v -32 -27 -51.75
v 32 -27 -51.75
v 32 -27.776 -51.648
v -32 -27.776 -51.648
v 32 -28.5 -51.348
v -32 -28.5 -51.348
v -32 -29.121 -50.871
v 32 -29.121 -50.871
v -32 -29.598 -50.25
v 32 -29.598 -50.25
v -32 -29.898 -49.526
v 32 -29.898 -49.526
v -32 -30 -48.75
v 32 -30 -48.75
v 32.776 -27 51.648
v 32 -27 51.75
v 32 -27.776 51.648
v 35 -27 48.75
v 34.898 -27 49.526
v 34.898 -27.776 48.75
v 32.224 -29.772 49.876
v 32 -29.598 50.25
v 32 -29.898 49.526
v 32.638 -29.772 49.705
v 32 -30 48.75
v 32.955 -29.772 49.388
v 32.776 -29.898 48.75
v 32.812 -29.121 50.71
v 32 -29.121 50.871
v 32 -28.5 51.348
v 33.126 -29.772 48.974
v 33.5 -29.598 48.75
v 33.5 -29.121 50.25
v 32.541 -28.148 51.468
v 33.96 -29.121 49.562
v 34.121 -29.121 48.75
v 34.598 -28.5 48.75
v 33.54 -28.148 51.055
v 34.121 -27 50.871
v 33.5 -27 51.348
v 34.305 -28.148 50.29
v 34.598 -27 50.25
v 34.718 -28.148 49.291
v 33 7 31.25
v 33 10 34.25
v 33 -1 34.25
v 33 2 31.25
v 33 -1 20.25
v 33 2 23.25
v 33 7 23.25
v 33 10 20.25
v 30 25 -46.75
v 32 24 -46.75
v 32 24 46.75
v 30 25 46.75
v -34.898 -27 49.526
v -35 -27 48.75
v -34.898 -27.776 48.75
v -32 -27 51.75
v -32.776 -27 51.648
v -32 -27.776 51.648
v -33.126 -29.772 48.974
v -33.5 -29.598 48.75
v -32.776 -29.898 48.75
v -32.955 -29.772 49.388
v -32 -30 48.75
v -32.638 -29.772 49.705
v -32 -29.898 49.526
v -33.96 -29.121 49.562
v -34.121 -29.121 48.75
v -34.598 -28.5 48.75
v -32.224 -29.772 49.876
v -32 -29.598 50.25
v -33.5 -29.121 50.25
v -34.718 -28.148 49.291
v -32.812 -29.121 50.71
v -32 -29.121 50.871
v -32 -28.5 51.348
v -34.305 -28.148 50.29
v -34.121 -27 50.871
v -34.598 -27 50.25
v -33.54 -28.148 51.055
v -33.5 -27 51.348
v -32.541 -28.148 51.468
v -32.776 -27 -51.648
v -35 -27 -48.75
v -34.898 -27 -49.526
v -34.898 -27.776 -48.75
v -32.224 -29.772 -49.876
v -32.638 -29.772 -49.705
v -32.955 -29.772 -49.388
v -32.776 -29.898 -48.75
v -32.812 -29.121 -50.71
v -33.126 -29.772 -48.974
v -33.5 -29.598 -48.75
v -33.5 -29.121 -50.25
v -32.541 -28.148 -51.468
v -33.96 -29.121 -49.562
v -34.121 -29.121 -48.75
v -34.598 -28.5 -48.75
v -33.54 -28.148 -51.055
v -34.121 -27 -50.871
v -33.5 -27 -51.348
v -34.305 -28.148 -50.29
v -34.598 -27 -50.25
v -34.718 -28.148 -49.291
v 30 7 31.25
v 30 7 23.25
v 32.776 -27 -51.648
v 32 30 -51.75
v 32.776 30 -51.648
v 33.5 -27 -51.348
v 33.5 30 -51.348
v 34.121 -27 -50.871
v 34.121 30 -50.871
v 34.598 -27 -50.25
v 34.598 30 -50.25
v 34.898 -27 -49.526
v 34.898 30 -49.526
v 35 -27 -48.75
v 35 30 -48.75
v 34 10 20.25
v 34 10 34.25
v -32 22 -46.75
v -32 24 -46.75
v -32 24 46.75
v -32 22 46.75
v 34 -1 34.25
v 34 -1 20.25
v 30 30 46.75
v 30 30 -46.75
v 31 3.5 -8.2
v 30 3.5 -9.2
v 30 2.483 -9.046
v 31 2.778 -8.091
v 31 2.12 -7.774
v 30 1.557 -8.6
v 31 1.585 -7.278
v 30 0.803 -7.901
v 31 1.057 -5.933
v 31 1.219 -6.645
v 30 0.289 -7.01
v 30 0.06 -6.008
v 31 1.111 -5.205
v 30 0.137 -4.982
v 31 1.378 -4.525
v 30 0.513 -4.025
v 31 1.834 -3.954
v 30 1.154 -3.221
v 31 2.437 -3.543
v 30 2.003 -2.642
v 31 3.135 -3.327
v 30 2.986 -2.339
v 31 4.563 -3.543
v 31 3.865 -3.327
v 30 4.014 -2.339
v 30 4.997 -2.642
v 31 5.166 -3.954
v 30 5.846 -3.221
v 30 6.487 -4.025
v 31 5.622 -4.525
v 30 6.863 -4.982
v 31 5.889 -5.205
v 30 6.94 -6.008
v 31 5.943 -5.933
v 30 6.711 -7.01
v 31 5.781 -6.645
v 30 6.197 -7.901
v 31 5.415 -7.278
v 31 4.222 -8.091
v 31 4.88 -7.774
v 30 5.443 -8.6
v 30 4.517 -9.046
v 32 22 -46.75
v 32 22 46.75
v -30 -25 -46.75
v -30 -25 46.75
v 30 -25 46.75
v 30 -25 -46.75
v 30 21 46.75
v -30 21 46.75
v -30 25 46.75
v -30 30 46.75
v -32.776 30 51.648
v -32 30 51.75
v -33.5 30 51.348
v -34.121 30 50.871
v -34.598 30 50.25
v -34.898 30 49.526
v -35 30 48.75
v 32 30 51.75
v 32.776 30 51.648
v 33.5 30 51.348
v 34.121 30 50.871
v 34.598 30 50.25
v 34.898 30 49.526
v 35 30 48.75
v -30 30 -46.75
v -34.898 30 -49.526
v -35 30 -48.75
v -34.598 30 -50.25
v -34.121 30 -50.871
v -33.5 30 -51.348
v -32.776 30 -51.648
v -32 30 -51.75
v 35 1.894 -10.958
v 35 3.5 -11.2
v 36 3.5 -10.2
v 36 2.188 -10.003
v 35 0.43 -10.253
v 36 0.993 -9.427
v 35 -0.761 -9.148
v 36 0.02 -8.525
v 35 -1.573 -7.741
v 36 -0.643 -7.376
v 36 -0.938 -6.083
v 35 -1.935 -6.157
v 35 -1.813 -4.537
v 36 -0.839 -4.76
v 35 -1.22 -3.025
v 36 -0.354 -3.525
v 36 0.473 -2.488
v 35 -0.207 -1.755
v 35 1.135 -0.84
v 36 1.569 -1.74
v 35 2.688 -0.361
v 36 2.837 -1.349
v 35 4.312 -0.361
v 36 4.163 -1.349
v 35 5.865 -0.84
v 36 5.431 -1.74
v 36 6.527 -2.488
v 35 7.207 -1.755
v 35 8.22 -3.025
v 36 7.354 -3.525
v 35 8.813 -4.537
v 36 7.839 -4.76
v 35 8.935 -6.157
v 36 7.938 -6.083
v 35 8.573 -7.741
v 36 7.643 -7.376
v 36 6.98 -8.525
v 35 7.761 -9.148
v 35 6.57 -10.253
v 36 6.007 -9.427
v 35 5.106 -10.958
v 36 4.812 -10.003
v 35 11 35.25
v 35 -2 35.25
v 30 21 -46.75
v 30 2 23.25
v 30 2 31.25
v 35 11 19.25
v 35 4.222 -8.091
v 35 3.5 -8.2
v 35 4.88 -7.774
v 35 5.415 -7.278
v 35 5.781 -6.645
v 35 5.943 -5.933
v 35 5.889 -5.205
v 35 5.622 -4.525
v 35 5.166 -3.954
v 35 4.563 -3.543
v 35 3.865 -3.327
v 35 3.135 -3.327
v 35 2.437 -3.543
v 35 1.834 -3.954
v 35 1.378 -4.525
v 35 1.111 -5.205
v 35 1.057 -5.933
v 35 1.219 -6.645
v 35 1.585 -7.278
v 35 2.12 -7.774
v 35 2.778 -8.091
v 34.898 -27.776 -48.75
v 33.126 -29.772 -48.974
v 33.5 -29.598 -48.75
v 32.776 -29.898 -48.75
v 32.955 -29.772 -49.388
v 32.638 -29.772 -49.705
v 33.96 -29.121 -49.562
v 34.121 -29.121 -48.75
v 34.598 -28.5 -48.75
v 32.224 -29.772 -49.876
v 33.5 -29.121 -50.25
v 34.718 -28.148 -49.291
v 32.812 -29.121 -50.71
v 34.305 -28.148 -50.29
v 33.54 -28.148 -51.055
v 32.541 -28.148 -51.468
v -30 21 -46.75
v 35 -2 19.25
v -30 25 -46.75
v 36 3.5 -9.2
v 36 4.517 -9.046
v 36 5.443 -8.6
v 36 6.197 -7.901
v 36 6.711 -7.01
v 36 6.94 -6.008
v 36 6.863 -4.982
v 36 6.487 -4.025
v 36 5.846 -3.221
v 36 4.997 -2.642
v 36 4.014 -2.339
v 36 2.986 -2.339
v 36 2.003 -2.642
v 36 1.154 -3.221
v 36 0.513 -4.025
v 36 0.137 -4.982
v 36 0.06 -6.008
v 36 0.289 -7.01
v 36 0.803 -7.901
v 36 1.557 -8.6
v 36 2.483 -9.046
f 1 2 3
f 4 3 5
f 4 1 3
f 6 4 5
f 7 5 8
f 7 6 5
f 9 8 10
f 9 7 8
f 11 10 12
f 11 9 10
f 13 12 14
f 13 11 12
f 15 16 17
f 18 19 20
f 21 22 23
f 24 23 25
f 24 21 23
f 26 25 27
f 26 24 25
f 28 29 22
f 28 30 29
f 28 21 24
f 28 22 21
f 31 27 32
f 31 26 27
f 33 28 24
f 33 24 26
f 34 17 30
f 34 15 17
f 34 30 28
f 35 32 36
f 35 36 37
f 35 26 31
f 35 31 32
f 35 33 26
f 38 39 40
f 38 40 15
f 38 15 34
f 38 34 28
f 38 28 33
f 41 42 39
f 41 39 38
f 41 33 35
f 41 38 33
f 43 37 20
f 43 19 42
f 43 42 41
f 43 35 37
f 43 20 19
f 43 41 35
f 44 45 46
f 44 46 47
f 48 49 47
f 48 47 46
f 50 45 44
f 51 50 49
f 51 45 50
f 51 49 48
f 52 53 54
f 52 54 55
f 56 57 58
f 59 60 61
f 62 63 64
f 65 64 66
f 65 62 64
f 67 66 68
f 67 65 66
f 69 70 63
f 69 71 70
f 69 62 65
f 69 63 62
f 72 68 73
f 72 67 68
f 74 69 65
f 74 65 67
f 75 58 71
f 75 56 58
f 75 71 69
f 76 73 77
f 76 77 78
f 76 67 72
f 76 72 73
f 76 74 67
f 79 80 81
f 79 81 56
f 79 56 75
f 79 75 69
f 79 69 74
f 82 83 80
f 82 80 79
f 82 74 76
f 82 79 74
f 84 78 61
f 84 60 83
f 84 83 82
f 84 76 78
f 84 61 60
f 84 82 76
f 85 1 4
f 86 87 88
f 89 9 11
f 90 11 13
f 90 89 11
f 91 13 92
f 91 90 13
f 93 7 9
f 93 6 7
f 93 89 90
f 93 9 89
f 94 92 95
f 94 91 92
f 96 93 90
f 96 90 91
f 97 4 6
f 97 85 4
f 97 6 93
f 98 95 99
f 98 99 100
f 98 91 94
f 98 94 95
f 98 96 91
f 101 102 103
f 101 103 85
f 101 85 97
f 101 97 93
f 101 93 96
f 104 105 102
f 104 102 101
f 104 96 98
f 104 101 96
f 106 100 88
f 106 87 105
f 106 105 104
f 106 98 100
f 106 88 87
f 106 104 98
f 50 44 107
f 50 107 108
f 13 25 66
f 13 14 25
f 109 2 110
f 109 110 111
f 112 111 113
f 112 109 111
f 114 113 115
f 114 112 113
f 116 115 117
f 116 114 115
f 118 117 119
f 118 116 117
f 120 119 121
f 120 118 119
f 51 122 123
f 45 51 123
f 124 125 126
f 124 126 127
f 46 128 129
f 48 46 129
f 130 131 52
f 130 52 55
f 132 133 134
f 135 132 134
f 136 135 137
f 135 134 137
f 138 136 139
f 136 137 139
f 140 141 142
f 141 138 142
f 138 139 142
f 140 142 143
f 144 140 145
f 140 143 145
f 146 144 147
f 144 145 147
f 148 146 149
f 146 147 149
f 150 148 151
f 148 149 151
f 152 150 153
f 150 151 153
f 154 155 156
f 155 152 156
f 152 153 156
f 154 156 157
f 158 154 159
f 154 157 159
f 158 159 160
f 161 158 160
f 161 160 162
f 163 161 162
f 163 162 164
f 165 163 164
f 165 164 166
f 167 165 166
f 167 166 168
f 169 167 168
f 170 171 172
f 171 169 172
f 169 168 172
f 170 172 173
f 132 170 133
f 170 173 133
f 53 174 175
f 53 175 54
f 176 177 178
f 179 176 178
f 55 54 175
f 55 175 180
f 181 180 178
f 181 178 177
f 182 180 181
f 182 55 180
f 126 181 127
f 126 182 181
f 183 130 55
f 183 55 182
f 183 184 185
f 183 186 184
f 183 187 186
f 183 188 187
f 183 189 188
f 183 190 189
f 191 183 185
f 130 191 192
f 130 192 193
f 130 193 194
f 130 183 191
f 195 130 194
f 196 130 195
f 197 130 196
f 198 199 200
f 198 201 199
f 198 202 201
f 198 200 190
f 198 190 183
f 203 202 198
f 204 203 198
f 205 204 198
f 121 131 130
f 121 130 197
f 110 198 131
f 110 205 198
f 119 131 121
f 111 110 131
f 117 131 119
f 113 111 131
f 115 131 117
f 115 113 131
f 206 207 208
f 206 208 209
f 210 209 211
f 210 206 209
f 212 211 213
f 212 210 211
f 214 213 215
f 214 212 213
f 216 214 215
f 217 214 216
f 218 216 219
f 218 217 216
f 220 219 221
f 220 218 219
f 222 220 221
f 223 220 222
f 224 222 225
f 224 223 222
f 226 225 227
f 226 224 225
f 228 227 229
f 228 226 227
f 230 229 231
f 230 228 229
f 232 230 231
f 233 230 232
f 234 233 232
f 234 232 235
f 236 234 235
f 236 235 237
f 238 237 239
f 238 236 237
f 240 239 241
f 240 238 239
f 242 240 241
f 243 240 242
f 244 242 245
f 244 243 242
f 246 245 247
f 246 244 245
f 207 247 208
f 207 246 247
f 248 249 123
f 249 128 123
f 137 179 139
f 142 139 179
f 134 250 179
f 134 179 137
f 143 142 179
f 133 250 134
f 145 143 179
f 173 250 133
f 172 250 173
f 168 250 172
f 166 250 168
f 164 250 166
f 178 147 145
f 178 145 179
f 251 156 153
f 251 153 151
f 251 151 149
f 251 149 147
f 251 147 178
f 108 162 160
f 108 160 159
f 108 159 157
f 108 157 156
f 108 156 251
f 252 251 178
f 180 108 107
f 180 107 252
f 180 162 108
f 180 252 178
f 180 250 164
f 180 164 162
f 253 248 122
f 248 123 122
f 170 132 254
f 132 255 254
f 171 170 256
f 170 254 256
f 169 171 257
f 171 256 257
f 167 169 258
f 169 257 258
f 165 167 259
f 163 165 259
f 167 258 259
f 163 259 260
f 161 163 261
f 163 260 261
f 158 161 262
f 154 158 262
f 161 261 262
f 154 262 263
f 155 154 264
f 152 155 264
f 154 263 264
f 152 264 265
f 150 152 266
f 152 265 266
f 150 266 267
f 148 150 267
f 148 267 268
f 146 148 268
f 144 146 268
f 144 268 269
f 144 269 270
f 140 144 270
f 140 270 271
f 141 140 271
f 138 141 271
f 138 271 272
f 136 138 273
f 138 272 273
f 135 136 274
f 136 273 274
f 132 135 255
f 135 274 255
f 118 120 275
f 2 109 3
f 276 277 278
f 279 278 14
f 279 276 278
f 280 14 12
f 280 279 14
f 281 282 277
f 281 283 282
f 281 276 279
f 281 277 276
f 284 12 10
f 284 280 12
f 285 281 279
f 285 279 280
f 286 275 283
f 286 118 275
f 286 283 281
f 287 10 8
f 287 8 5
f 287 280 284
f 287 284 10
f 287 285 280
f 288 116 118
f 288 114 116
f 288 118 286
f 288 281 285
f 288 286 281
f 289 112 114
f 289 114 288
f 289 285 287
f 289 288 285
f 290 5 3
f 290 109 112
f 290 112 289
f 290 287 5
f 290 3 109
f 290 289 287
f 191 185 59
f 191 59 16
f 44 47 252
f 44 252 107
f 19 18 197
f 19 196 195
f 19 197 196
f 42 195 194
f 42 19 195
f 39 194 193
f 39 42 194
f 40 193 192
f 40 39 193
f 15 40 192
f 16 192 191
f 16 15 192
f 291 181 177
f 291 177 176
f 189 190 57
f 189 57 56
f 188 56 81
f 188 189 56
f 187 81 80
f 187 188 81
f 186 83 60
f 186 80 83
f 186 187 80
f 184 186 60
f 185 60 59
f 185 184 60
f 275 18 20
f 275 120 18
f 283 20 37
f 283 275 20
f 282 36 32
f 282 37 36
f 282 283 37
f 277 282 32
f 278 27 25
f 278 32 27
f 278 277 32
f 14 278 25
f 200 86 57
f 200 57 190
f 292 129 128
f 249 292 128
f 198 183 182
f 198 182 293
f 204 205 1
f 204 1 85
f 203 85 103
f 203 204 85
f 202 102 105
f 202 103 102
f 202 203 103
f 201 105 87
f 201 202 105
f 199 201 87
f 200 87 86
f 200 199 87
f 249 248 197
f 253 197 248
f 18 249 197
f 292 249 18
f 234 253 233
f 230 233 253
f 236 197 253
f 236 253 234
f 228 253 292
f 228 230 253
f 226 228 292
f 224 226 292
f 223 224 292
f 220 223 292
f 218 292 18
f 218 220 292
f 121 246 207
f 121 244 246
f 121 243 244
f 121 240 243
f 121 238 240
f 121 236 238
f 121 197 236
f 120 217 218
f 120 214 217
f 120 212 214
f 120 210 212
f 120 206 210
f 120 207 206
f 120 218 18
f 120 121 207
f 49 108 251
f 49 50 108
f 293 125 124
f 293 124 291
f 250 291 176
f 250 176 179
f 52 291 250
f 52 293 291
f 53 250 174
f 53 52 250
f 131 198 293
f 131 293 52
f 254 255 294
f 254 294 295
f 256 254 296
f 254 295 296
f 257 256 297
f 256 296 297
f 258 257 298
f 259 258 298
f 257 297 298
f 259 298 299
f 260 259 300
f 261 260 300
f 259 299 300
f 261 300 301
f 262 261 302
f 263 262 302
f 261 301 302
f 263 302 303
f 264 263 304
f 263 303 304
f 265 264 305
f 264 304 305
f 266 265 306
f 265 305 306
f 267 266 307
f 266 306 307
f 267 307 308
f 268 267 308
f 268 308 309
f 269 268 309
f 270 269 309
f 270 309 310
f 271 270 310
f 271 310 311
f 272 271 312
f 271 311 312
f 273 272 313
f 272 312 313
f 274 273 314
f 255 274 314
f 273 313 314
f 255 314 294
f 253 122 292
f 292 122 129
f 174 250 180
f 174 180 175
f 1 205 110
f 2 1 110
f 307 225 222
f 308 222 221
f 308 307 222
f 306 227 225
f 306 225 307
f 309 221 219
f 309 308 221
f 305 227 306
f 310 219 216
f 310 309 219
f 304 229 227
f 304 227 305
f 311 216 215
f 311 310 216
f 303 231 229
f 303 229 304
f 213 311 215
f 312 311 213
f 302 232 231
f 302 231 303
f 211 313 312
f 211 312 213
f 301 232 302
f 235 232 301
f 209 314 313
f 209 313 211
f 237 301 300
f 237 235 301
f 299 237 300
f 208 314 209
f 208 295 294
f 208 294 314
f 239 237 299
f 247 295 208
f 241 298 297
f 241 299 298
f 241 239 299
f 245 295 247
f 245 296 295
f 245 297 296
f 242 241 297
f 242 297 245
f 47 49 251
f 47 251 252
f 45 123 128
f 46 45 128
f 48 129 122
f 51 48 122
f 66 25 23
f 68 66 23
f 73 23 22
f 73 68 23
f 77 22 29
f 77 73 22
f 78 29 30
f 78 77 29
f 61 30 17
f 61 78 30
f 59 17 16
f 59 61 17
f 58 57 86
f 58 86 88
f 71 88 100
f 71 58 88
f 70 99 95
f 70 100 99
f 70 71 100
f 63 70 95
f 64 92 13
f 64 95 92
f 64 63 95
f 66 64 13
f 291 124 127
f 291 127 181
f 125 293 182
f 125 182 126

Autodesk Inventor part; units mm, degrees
ref_plane "YZ Plane" through (0, 0, 0) normal (1, 0, 0) x (0, 1, 0)
ref_plane "XZ Plane" through (0, 0, 0) normal (0, 1, 0) x (-1, 0, 0)
sketch "Sketch1" plane through (0, 0, 0) normal (0, 0, 1) x (1, 0, 0)
  line L0 (-35, 30) -> (35, 30)
  line L1 (35, 30) -> (35, -30)
  line L2 (35, -30) -> (-35, -30)
  line L3 (-35, -30) -> (-35, 30)
  point P0 (0, 0)
  point P1 (0, 30)
  point P2 (-35, 0)
  dimension "d0" = 70
  dimension "d1" = 60
extrude "Extrusion1" add sketch "Sketch1" along normal mid plane 103.5
sketch "Sketch2" plane through (-35, 30, 51.75) normal (0, 1, 0) x (1, 0, 0)
  line L0 (0, 103.5) -> (70, 103.5) projected
  line L1 (5, 98.5) -> (65, 98.5)
  line L2 (65, 98.5) -> (65, 5)
  line L3 (65, 5) -> (5, 5)
  line L4 (5, 5) -> (5, 98.5)
  point P0 (35, 51.75)
  point P1 (5, 51.75)
  point P2 (35, 98.5)
  point P3 (35, 103.5)
  dimension "d4" = 93.5
  dimension "d5" = 60
extrude "Extrusion2" cut sketch "Sketch2" against normal blind 55
fillet "Fillet2" radius 3 8 edges at (35, 0, 51.75) (35, 0, -51.75) (-35, 0, 51.75) (-35, 0, -51.75) (35, -30, 0) (0, -30, 51.75) (-35, -30, 0) (0, -30, -51.75)
ref_plane "Work Plane1" through (0, 0, 0) normal (0, 0, 1) x (1, 0, 0)
sketch "Sketch3" plane through (0, 0, 0) normal (0, 0, 1) x (1, 0, 0)
  line L0 (-30, 30) -> (-30, -25) projected
  line L1 (-30, 25) -> (-32, 24)
  line L2 (-32, 24) -> (-32, 22)
  line L3 (-32, 30) -> (-32, -27) projected
  line L4 (-32, 22) -> (-30, 21)
  line L5 (-30, 21) -> (-30, 25)
  point P0 (0, 0)
  point P1 (-32, -25)
  dimension "d12" = 5
  dimension "d13" = 4
  dimension "d14" = 2
  dimension "d15" = 2
extrude "Extrusion3" cut sketch "Sketch3" along normal mid plane 93.5
mirror "Mirror1" about plane through (0, 0, 0) normal (1, 0, 0) of "Extrusion3"
sketch "Sketch8" plane through (35, -27, 48.75) normal (1, 0, 0) x (0, 0, -1)
  line L0 (97.5, 57) -> (0, 57) projected
  circle A0 centre (54.5, 30.5) radius 5.45
  line L1 (100.5, 0) -> (100.5, 57) projected
  line L2 (2, 2) -> (95.5, 2) projected
  point P0 (48.75, 27)
  dimension "d31" = 46
  dimension "d32" = 28.5
  dimension "d33" = 10.9
extrude "Extrusion7" add sketch "Sketch8" along normal blind 1
sketch "Sketch9" plane through (36, 3.5, -5.75) normal (1, 0, 0) x (0, 0, -1)
  circle A0 centre (0, 0) radius 5.45 projected
  circle A1 centre (0, 0) radius 2.45
  point P0 (-5.75, -3.5)
  dimension "d36" = 4.9
extrude "Extrusion8" cut sketch "Sketch9" against normal up to surface (6 mm away) contours A1
chamfer "Chamfer1" distance 1 angle 45 3 edges at (36, 3.5, -3.3) (36, 3.5, -0.3) (30, 3.5, -3.3)
sketch "Sketch10" plane through (35, -27, 48.75) normal (1, 0, 0) x (0, 0, -1)
  line L0 (14.5, 26) -> (28.5, 26)
  line L1 (28.5, 26) -> (28.5, 37)
  line L2 (28.5, 37) -> (14.5, 37)
  line L3 (14.5, 37) -> (14.5, 26)
  line L4 (2, 48) -> (2, 2) projected
  line L5 (95.5, 2) -> (2, 2) projected
  point P0 (48.75, 27)
  dimension "d42" = 12.5
  dimension "d44" = 11
  dimension "d45" = 14
  dimension "d58" = 24
extrude "Extrusion9" cut sketch "Sketch10" against normal blind 2
sketch "Sketch11" plane through (33, -27, 48.75) normal (1, 0, 0) x (0, 0, -1)
  line L0 (17.5, 34) -> (25.5, 34)
  line L1 (25.5, 34) -> (25.5, 29)
  line L2 (25.5, 29) -> (17.5, 29)
  line L3 (17.5, 29) -> (17.5, 34)
  line L4 (14.5, 37) -> (28.5, 37) projected
  line L5 (14.5, 26) -> (14.5, 37) projected
  point P0 (48.75, 27)
  point P1 (17.5, 31.5)
  point P2 (14.5, 31.5)
  point P3 (21.5, 37)
  point P4 (21.5, 34)
  dimension "d48" = 5
  dimension "d49" = 8
extrude "Extrusion10" cut sketch "Sketch11" against normal up to surface (3 mm away)
chamfer "Chamfer2" distance 1 angle 45 4 edges at (35, 10, 27.25) (35, 4.5, 20.25) (35, 4.5, 34.25) (35, -1, 27.25)
properties part number "Part_A1"
